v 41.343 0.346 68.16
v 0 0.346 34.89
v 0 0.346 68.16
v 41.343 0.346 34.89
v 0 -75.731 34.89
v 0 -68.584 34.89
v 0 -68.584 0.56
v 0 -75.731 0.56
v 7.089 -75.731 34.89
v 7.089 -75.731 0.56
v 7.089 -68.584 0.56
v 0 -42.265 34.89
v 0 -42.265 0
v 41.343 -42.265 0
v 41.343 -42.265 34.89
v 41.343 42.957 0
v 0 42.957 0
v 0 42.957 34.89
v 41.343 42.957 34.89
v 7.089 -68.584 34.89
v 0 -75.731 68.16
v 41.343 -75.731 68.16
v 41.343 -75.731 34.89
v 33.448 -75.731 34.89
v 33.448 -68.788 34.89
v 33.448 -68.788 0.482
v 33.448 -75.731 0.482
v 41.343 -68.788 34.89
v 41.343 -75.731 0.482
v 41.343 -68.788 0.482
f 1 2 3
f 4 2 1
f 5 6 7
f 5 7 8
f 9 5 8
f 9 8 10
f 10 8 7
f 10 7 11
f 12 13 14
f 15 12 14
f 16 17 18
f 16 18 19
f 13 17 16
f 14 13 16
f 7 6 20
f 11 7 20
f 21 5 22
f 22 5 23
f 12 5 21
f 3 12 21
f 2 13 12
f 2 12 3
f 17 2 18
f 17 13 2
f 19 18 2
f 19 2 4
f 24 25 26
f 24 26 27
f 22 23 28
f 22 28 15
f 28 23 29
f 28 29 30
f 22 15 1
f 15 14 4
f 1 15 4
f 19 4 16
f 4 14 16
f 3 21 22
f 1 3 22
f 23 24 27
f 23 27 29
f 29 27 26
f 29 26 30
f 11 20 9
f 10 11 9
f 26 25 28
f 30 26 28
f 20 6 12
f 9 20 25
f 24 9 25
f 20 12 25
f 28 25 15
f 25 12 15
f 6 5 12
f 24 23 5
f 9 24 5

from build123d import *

# Parameters (mm, degrees)
F0_W     = 41.342575
F0_H     = 85.221954
F1_DEPTH = 34.889519
F2_W     = 41.342575
F2_H     = 76.076616
F3_DEPTH = 33.270478
F4_W     = 7.088874
F4_H     = 7.146471
F5_DEPTH = 34.3295
F6_W     = 7.894669
F6_H     = 6.943033
F7_DEPTH = 34.407657


with BuildPart() as f1:
    # F0 (on Top) → F1 (new body)
    with BuildSketch(Plane.XY):
        with Locations((20.671287, 0.345733)):
            Rectangle(F0_W, F0_H)
    extrude(amount=F1_DEPTH)

    # F2 (on face) → F3 (join)
    with BuildSketch(Plane.XY.offset(34.889519)):
        with Locations((20.671287, -37.692575)):
            Rectangle(F2_W, F2_H)
    extrude(amount=F3_DEPTH)

    # F4 (on face) → F5 (join)
    with BuildSketch(Plane(origin=(0, 0, 34.889519), x_dir=(1, 0, 0), z_dir=(0, 0, -1))):
        with Locations((3.544437, 72.157647)):
            Rectangle(F4_W, F4_H)
    extrude(amount=F5_DEPTH)

    # F6 (on face) → F7 (join)
    with BuildSketch(Plane(origin=(0, 0, 34.889519), x_dir=(1, 0, 0), z_dir=(0, 0, -1))):
        with Locations((37.39524, 72.259366)):
            Rectangle(F6_W, F6_H)
    extrude(amount=F7_DEPTH)


solid = f1.part
